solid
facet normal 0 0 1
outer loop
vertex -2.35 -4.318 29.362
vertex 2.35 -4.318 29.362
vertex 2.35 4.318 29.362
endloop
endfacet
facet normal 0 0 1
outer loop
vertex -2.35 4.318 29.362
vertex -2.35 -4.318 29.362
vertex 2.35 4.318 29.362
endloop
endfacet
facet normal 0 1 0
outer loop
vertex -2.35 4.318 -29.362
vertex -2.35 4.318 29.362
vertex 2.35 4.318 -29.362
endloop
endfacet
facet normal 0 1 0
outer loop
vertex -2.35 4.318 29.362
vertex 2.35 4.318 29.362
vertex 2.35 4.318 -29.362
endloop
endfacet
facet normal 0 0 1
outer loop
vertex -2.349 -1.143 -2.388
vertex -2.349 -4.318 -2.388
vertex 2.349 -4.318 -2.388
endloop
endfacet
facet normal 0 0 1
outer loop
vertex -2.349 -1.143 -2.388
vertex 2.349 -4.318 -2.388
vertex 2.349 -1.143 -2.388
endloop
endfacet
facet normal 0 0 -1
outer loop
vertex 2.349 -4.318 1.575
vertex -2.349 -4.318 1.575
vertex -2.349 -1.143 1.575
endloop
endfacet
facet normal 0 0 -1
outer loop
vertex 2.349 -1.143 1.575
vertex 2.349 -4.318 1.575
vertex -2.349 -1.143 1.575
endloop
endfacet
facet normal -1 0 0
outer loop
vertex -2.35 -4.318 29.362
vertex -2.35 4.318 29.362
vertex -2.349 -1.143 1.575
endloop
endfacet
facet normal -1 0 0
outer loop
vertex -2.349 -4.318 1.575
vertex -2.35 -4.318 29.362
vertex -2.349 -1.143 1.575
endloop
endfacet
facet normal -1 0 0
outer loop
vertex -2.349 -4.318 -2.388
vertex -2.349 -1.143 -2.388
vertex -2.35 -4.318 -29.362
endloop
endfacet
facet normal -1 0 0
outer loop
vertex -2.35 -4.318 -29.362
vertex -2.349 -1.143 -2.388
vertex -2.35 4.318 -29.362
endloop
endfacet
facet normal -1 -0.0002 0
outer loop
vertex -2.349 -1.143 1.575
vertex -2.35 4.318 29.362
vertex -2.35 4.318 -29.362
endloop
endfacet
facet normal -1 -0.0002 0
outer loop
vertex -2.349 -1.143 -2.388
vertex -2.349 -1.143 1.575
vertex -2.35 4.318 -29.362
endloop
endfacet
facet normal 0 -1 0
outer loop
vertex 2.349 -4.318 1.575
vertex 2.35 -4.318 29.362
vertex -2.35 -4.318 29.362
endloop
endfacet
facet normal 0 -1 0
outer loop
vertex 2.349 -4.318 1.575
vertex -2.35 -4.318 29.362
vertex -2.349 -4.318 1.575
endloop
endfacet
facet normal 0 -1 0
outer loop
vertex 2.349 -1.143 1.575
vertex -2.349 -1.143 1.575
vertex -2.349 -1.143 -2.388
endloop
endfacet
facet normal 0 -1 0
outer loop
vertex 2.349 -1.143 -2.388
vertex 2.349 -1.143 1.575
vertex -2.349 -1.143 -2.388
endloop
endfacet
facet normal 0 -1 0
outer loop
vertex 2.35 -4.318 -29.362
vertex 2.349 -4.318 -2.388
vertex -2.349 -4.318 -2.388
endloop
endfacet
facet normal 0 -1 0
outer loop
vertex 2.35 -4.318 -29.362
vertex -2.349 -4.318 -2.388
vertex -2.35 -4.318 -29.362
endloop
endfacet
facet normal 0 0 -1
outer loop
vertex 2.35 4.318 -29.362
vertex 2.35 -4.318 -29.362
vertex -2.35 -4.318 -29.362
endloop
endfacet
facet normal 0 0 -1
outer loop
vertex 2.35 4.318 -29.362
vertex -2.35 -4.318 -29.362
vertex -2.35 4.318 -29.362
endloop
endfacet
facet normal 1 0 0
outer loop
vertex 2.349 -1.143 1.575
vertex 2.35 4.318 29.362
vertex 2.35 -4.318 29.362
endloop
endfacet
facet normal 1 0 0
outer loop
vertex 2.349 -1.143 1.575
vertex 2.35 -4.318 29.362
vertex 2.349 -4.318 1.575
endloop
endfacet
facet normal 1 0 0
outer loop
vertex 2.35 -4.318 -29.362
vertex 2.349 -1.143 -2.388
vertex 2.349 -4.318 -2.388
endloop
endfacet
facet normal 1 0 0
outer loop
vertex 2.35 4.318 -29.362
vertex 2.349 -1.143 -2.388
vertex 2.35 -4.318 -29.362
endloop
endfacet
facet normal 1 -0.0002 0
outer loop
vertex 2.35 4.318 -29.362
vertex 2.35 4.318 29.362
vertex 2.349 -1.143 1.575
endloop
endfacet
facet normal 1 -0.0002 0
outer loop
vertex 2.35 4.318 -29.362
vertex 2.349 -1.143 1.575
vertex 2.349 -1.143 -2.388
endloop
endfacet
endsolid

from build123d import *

# Parameters (mm, degrees)
SKETCH1_W               = 58.7248
SKETCH1_H               = 8.636
BOSS_EXTRUDE1_DEPTH     = 2.3495
CUT_EXTRUDE1_DEPTH      = 31.047899407
CUT_EXTRUDE1_DEPTH_BACK = 31.047899407
SKETCH2_W               = 3.9624
SKETCH2_H               = 3.175


with BuildPart() as part:
    # Sketch1 → Boss-Extrude1 (new, symmetric)
    with BuildSketch(Plane(origin=(0, 0, 0), x_dir=(0, 0, -1), z_dir=(1, 0, 0))):
        Rectangle(SKETCH1_W, SKETCH1_H)
    extrude(amount=BOSS_EXTRUDE1_DEPTH, both=True)

    # Sketch2 → Cut-Extrude1 (cut, two sides: drawn at the far end of the back side and taken through both)
    with BuildSketch(Plane(origin=(2.3495, 0, 0), x_dir=(0, 0, -1), z_dir=(1, 0, 0)).offset(-CUT_EXTRUDE1_DEPTH_BACK)):
        with Locations((0.4064, -2.7305)):
            Rectangle(SKETCH2_W, SKETCH2_H)
    extrude(amount=CUT_EXTRUDE1_DEPTH + CUT_EXTRUDE1_DEPTH_BACK, mode=Mode.SUBTRACT)


solid = part.part
